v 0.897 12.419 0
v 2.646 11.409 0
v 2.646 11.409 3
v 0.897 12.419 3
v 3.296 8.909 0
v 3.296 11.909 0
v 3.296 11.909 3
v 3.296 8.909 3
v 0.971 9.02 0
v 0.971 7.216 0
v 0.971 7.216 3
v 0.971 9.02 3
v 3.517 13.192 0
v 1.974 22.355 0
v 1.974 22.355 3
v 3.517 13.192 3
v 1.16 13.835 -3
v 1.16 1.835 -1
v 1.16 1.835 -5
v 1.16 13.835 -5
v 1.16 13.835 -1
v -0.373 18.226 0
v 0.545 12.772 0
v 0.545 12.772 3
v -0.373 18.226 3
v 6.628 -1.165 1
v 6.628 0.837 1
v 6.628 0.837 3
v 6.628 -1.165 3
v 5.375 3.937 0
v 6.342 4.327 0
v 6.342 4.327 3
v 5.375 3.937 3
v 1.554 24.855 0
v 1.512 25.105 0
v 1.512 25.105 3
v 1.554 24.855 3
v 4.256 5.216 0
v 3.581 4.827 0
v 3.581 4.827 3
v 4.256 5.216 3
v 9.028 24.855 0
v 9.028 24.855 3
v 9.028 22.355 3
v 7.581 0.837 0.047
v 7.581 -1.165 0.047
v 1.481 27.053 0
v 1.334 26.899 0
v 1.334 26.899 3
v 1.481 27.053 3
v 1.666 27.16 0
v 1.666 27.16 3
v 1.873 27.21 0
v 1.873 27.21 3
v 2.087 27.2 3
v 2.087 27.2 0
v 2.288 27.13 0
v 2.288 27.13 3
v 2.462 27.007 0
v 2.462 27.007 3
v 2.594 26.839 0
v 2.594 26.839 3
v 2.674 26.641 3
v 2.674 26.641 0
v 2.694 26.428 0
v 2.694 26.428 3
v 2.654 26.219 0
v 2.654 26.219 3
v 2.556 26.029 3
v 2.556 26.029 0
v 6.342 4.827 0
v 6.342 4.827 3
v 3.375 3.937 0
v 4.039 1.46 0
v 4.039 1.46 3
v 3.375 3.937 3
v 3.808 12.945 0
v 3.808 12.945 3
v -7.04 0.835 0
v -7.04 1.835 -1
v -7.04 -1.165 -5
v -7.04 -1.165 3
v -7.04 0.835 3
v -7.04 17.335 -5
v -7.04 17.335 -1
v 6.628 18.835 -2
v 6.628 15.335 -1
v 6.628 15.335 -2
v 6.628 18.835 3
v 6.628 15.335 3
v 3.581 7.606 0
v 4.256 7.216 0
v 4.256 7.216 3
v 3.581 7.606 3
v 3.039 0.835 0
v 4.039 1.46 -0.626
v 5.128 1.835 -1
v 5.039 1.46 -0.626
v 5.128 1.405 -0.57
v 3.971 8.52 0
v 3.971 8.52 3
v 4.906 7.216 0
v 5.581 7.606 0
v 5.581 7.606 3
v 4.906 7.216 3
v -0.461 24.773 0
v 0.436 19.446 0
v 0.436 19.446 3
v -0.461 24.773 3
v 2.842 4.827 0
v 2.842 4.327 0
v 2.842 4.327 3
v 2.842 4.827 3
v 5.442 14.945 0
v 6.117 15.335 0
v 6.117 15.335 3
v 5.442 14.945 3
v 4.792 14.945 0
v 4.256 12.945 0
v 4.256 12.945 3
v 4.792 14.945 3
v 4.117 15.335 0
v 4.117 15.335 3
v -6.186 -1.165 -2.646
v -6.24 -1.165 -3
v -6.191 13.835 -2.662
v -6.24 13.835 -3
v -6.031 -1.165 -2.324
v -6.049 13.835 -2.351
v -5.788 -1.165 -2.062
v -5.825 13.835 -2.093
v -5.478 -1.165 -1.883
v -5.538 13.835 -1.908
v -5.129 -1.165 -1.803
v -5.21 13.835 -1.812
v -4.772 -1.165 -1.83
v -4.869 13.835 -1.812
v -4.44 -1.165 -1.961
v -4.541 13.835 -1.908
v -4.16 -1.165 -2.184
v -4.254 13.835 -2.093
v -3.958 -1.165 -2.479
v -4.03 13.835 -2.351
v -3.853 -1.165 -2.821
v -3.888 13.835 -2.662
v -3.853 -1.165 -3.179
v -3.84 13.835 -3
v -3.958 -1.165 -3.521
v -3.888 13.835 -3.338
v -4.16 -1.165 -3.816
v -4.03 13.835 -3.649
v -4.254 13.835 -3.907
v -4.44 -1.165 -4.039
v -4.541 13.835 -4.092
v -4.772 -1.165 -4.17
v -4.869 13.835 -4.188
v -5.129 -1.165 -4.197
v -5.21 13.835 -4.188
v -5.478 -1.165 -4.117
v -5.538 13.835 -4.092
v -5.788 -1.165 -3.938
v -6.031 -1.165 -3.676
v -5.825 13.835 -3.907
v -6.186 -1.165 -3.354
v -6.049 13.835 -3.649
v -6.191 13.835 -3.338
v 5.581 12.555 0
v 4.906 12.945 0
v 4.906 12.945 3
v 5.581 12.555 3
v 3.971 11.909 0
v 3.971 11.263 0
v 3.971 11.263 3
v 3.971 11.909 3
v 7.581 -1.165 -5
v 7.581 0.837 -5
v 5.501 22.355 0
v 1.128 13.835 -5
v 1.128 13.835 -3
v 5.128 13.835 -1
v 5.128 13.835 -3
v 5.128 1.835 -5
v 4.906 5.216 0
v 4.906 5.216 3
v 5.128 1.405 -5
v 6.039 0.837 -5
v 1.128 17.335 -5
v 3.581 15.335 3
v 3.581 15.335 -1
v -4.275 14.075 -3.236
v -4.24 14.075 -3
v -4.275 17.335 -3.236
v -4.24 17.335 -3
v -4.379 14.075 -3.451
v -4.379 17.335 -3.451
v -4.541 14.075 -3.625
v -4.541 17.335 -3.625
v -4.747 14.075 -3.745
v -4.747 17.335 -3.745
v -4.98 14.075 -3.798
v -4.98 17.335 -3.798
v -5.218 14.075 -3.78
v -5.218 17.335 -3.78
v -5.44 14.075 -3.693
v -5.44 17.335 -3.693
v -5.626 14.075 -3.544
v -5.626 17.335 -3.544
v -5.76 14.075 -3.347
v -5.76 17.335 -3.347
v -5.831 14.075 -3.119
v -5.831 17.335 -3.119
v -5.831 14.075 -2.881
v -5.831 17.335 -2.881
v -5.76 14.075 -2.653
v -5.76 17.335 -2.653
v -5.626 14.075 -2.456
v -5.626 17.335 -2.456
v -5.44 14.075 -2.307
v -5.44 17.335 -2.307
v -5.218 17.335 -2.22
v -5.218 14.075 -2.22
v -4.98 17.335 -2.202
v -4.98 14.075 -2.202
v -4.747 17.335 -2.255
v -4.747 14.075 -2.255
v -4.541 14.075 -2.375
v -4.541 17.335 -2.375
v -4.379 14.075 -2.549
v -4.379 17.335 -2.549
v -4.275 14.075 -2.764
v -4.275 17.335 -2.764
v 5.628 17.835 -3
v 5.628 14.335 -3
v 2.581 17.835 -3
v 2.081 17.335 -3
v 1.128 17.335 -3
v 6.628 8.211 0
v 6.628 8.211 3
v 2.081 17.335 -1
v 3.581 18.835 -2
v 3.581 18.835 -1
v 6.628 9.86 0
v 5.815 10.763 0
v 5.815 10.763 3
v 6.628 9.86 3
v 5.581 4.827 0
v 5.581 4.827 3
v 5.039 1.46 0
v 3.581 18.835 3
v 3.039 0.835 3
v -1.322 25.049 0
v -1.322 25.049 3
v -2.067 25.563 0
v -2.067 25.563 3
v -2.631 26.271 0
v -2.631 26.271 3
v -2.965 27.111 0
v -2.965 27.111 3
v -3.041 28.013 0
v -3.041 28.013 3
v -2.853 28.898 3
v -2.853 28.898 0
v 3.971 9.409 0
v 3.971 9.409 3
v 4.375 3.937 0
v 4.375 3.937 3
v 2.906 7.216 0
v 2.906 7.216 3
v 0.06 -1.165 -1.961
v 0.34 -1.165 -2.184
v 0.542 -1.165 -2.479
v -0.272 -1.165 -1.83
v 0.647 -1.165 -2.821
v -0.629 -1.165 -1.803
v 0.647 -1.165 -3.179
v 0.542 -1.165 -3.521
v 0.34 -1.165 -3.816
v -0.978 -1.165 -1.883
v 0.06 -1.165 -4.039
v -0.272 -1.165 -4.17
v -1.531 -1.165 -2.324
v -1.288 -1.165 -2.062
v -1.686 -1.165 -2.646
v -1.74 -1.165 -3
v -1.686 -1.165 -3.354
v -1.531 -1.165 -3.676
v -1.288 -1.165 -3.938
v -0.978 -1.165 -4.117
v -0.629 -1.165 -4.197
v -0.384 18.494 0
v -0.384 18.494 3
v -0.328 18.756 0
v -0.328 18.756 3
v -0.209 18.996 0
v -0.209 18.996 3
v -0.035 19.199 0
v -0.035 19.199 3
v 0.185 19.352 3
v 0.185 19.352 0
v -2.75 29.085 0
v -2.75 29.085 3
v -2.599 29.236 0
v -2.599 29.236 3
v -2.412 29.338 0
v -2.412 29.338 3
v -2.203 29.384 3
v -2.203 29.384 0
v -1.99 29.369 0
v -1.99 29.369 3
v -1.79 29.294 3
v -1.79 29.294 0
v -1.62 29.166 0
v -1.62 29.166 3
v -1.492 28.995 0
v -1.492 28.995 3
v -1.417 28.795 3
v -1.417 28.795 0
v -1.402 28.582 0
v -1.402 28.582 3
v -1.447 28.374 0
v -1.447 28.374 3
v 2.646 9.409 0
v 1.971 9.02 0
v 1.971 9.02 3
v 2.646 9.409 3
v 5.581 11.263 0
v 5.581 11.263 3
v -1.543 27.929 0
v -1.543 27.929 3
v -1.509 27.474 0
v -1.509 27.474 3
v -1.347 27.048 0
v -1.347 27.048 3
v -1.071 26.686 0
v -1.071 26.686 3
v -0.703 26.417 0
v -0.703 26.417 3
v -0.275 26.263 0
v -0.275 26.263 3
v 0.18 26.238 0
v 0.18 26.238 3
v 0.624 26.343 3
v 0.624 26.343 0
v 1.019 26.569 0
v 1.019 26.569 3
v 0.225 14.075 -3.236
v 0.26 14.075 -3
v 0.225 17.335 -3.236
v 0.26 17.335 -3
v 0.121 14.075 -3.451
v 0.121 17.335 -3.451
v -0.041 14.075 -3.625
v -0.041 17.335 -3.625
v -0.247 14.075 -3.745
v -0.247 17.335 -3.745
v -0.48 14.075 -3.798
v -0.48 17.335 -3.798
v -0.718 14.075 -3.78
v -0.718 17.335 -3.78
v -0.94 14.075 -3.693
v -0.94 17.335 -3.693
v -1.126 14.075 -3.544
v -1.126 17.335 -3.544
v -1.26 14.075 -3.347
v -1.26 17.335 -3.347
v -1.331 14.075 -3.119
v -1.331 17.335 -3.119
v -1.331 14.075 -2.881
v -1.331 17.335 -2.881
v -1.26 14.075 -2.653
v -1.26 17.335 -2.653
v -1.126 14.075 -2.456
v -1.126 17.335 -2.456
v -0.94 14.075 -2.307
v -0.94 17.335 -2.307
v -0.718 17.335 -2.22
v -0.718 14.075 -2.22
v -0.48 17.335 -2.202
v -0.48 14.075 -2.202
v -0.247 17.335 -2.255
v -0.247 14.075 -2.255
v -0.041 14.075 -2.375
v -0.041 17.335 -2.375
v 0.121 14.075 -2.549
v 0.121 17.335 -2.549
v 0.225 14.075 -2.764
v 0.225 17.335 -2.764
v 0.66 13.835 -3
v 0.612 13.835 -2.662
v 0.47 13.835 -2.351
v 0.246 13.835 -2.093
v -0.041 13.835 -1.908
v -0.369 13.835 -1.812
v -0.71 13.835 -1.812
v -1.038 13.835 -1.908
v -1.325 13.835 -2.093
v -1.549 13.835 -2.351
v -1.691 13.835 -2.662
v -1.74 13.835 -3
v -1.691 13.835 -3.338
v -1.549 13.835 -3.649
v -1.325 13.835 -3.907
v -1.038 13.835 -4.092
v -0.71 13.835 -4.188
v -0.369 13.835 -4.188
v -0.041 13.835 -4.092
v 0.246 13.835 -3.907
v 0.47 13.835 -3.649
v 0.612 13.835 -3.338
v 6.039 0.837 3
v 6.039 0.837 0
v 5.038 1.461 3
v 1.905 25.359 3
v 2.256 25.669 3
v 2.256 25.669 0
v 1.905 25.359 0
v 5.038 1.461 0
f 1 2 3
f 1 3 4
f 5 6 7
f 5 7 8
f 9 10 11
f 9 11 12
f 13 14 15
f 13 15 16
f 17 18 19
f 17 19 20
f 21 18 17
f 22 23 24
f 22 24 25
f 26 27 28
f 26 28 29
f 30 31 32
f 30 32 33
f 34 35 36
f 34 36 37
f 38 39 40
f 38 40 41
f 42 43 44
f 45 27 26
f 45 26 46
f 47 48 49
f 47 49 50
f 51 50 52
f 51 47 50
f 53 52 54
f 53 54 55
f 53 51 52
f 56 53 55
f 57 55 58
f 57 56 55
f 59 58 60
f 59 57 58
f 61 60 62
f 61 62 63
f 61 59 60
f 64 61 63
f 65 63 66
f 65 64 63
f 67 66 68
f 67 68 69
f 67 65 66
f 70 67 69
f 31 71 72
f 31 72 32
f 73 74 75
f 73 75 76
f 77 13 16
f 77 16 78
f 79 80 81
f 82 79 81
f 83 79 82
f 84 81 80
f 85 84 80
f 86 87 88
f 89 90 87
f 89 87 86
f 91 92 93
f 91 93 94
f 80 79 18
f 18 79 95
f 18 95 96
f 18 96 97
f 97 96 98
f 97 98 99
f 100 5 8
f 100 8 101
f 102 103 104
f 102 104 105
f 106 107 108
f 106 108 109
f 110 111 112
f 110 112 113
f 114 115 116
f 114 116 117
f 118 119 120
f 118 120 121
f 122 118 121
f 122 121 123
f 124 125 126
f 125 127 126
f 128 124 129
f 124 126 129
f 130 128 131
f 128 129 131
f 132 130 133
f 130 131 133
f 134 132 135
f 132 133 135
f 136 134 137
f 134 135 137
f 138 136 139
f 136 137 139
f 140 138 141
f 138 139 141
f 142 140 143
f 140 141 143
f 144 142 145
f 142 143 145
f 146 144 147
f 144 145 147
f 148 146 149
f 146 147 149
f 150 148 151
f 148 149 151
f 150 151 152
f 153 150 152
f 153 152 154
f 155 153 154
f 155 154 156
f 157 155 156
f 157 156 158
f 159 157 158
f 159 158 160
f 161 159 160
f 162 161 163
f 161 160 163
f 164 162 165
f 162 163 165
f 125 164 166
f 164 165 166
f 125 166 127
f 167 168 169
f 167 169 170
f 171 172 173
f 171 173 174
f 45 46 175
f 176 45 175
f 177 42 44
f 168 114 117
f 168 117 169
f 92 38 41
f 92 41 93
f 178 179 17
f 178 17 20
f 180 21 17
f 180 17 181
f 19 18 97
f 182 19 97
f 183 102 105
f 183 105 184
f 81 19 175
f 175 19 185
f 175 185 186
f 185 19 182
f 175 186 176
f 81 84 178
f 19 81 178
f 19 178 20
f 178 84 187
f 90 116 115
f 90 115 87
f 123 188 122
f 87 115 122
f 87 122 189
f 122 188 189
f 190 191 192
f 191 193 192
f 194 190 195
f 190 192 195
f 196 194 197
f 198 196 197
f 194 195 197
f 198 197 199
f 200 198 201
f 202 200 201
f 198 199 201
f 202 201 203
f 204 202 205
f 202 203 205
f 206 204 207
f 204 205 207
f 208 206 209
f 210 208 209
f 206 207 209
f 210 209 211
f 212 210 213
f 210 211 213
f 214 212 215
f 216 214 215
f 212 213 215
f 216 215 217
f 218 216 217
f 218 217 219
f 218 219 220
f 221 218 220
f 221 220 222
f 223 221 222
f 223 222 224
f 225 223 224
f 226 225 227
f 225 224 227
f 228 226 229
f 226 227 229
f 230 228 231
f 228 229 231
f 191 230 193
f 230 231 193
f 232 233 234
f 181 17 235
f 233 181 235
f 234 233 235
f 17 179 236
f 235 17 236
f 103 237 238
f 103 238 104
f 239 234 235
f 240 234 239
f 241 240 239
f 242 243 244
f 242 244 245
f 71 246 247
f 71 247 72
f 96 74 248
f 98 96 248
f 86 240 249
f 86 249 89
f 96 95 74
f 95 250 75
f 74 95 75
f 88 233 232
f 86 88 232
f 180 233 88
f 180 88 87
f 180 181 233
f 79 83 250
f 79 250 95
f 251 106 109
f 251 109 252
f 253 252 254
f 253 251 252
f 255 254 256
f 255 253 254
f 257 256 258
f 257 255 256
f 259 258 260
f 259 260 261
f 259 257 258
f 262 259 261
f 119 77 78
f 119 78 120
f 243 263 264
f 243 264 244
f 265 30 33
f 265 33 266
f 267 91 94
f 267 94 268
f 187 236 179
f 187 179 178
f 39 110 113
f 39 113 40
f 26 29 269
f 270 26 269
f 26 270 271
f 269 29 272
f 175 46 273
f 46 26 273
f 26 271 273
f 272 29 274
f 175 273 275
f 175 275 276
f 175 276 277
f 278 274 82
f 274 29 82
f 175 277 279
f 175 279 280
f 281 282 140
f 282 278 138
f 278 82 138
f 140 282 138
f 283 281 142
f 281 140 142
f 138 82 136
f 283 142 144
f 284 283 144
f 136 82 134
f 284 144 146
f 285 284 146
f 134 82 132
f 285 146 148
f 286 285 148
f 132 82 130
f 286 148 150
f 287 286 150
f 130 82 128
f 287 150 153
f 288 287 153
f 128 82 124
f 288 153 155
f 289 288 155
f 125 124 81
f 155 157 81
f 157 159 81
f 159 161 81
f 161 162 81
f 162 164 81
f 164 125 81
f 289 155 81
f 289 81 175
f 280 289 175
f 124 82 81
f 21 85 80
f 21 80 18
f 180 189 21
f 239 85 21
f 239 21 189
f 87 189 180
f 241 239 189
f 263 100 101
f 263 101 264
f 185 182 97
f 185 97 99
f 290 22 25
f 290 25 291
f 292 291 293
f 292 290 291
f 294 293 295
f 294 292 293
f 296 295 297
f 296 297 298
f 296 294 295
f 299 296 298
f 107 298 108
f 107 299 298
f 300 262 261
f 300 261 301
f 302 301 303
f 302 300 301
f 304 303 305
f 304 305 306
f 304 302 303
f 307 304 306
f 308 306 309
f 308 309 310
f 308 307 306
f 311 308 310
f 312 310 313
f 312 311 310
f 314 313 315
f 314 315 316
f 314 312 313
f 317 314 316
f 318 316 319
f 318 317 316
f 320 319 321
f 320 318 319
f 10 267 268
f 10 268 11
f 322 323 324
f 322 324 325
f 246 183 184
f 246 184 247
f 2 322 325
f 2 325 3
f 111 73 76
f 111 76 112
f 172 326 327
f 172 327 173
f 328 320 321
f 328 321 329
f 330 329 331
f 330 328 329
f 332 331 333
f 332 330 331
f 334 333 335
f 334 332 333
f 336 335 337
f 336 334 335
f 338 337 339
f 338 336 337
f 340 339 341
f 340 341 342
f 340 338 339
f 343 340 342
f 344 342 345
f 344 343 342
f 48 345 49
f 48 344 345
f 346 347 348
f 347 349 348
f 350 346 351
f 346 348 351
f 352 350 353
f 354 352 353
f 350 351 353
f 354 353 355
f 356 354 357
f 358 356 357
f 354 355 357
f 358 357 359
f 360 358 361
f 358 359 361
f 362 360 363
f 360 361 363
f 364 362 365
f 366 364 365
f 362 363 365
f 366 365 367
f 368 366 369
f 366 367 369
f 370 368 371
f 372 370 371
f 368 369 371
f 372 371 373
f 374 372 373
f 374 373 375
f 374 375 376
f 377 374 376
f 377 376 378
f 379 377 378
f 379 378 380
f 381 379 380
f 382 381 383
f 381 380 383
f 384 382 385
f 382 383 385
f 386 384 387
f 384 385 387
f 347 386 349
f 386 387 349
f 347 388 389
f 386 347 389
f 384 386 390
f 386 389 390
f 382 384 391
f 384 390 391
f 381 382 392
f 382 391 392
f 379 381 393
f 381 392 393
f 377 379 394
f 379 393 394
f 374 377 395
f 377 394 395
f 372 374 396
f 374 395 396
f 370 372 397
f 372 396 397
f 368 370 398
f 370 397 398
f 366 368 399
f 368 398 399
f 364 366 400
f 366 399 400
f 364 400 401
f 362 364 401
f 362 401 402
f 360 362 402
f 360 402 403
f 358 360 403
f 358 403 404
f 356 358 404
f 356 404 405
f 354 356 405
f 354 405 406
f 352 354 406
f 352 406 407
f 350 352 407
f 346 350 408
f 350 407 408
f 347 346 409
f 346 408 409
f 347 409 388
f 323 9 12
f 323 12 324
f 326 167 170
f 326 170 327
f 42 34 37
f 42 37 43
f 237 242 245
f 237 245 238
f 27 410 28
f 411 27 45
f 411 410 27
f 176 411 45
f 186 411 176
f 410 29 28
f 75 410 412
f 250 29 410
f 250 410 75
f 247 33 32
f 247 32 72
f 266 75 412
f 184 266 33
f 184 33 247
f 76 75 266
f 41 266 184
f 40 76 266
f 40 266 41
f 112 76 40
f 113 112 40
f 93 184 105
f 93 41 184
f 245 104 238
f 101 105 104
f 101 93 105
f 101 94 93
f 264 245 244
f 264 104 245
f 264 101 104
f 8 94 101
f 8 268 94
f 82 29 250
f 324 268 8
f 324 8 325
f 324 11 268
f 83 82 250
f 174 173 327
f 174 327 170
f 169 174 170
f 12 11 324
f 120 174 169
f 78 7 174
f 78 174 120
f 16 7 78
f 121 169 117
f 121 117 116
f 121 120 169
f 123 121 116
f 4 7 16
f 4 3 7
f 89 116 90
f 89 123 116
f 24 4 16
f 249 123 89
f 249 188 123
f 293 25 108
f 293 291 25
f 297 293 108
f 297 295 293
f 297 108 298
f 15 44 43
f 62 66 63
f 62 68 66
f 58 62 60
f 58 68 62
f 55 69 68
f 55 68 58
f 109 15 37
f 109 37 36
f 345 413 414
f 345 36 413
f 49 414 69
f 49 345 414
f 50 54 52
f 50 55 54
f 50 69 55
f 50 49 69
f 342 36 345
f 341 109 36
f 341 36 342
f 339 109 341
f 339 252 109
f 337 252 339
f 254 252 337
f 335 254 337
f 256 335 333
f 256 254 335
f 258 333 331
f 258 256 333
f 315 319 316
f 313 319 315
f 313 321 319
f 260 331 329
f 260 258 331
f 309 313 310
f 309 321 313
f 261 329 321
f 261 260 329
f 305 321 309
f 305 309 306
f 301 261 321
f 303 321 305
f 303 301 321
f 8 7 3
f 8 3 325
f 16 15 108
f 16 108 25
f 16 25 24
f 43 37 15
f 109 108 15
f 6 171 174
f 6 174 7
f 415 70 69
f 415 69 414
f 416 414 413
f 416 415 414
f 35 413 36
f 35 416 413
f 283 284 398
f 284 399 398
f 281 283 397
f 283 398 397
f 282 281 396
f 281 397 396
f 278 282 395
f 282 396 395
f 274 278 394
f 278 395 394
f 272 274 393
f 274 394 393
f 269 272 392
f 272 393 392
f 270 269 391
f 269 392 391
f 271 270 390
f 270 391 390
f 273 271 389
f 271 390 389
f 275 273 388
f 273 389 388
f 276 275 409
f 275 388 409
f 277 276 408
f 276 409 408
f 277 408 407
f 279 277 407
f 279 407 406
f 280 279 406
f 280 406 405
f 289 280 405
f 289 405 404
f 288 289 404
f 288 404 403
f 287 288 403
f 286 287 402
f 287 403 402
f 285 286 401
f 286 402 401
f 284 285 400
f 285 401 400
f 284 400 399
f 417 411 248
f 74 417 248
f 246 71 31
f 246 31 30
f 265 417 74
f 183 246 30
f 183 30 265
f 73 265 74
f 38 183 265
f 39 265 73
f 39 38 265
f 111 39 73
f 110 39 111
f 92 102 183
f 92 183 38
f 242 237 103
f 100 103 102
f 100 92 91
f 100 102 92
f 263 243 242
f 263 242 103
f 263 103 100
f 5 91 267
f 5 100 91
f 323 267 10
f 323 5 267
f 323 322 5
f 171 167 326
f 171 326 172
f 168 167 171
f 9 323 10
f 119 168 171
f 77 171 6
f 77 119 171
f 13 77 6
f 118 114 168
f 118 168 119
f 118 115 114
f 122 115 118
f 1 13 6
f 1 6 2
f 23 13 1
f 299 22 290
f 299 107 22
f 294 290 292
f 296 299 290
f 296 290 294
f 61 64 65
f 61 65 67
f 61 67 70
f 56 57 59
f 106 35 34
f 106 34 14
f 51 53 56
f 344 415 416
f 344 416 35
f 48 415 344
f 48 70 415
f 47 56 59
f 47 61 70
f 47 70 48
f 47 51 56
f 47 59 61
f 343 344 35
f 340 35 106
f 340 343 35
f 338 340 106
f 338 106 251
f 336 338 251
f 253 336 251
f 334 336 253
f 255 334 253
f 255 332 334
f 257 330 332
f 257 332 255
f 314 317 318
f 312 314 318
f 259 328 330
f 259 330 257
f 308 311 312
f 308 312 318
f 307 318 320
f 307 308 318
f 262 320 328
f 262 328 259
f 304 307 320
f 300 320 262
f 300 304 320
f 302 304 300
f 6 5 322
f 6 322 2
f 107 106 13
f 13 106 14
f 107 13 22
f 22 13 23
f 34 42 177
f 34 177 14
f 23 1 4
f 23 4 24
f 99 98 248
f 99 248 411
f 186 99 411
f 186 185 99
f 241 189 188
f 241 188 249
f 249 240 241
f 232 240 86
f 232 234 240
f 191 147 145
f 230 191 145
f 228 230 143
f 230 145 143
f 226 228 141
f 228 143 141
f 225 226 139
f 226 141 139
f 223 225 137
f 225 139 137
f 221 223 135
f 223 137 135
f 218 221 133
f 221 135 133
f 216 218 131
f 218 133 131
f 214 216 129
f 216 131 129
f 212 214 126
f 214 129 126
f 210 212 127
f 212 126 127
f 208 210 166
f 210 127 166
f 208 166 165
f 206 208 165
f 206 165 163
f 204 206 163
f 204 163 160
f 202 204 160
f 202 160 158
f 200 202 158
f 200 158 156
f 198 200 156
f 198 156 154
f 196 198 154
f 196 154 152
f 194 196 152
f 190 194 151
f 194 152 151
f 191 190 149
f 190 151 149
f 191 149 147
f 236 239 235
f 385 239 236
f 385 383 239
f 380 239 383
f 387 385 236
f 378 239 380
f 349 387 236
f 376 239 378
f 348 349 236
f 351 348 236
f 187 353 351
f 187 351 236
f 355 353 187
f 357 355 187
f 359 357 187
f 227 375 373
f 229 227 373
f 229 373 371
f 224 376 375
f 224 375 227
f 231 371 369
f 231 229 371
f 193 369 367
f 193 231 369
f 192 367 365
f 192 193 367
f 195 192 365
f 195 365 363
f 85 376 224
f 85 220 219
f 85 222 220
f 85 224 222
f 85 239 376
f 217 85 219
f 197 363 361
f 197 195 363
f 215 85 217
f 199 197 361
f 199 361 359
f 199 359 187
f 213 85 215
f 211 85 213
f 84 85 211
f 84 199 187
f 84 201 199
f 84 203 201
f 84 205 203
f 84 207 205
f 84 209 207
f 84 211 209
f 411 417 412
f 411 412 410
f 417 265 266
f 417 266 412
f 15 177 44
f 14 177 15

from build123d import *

# Parameters (mm, degrees)
BOSS_SWITCH_BODY_DEPTH                    = 3
SKETCH1_W                                 = 4
SKETCH1_H                                 = 3.5
BOSS_FLANGE_WIDTH_DEPTH                   = 5
BOSS_FLANGE_HEIGHT_REACH                  = 35.863
SKETCH2_W                                 = 4
SKETCH2_H                                 = 2
SKETCH2_W_2                               = 8
CUT_UP_TO_DOWN_DERAILLEUR_CLEARANCE_REACH = 21.462
SKETCH10_W                                = 2.453096586
SKETCH10_H                                = 3
SKETCH17_W                                = 12.1675
SKETCH17_H                                = 4
BOSS_FLANGE_SUPPORT_DEPTH                 = 14.5
TAP_DRILL_FOR_M2X0_4_TAP1_D               = 1.6
M2_CLEARANCE_HOLE2_D                      = 2.4
M2_CLEARANCE_HOLE2_DEPTH                  = 15
M2_CLEARANCE_HOLE2_TIP                    = 0.721032743
CHAMFER_FLANGE_SUPPORT_SIZE               = 1.5
CHAMFER_FLANGE_SUPPORT_2_SIZE             = 1.5
CHAMFER_FLANGE_SUPPORT_3_SIZE             = 1
SKETCH23_W                                = 3.9675
SKETCH23_H                                = 12
CUT_GAP_FOR_PRINTING_DEPTH                = 32.000499688
SKETCH25_W                                = 0.953096586
SKETCH25_H                                = 3.5
CUT_DERAILLEUR_CLEARANCE_DEPTH            = 32.145320369
CHAMFER8_SIZE                             = 1
CUT_EXTRUDE1_REACH                        = 30.441
SKETCH26_W                                = 7.075346244
SKETCH26_H                                = 3.905124838
CUT_WIDE_DERAILLEUR_CLEARANCE_DEPTH       = 33.195879702
CUT_WIDE_DERAILLEUR_CLEARANCE_DEPTH_BACK  = 4
SKETCH27_W                                = 2
SKETCH27_H                                = 5
CHAMFER9_SIZE                             = 1


# Some blends are built 0.0001 mm under size
with BuildPart() as part:
    # Sketch-SwitchBossUp → Boss-Switch Body (new body)
    with BuildSketch(Plane.XY):
        with BuildLine():
            Line((5.581091201, 12.555245643), (5.581100766, 11.263016279))
            Line((5.581100766, 11.263016279), (3.971265023, 11.263016279))
            Line((3.971265023, 11.263016279), (3.971265023, 11.909403061))
            Line((3.971265023, 11.909403061), (3.296271341, 11.909403061))
            Line((3.296271341, 11.909403061), (3.296271341, 11.409403061))
            Line((3.296271341, 11.409403061), (3.296271341, 9.409403061))
            Line((3.296271341, 9.409403061), (3.296271341, 8.909403061))
            Line((3.296271341, 8.909403061), (3.971278743, 8.519687356))
            Line((3.971278743, 8.519687356), (3.971278743, 9.409408058))
            Line((3.971278743, 9.409408058), (5.815189336, 10.763016279))
            Line((5.815189336, 10.763016279), (6.627976927, 9.860324207))
            Line((6.627976927, 9.860324207), (6.627976927, 8.210536506))
            Line((6.627976927, 8.210536506), (5.581127833, 7.606137899))
            Line((5.581127833, 7.606137899), (4.906138119, 7.216432406))
            Line((4.906138119, 7.216432406), (4.906138119, 5.216432406))
            Line((4.906138119, 5.216432406), (5.58114552, 4.826716701))
            Line((5.58114552, 4.826716701), (6.342350466, 4.826716701))
            Line((6.342350466, 4.826716701), (6.342350466, 4.326716701))
            Line((6.342350466, 4.326716701), (5.374946804, 3.937018274))
            Line((5.374946804, 3.937018274), (4.374946804, 3.937018274))
            Line((4.374946804, 3.937018274), (5.038286759, 1.461399857))
            Line((5.038286759, 1.461399857), (6.03883266, 0.837018274))
            Line((6.03883266, 0.837018274), (6.627976927, 0.837018274))
            Line((6.627976927, 0.837018274), (6.627976927, -1.165310653))
            Line((6.627976927, -1.165310653), (5.038286759, -1.165310653))
            Line((5.038286759, -1.165310653), (3.03883266, -1.165310653))
            Line((3.03883266, -1.165310653), (3.03883266, 0.834689347))
            Line((3.03883266, 0.834689347), (4.03855971, 1.460381193))
            Line((4.03855971, 1.460381193), (3.374946804, 3.937018274))
            Line((3.374946804, 3.937018274), (2.842350466, 4.326720436))
            Line((2.842350466, 4.326720436), (2.842350466, 4.826720436))
            Line((2.842350466, 4.826720436), (3.58114552, 4.826720436))
            Line((3.58114552, 4.826720436), (4.256138119, 5.216427595))
            Line((4.256138119, 5.216427595), (4.256138119, 7.216427595))
            Line((4.256138119, 7.216427595), (3.581130717, 7.6061433))
            Line((3.581130717, 7.6061433), (2.9061262, 7.216422599))
            Line((2.9061262, 7.216422599), (0.971281627, 7.216422599))
            Line((0.971281627, 7.216422599), (0.971281627, 9.019692757))
            Line((0.971281627, 9.019692757), (1.971281627, 9.019692757))
            Line((1.971281627, 9.019692757), (2.646271341, 9.40939825))
            Line((2.646271341, 9.40939825), (2.646271341, 11.40939825))
            Line((2.646271341, 11.40939825), (0.897326855, 12.41915182))
            Line((0.897326855, 12.41915182), (0.545466745, 12.771663724))
            Line((0.545466745, 12.771663724), (-0.372784255, 18.226393961))
            ThreePointArc((-0.372784255, 18.226393961), (-0.209313172, 18.996084896), (0.435897335, 19.446473985))
            Line((0.435897335, 19.446473985), (-0.46073685, 24.772792819))
            ThreePointArc((-0.46073685, 24.772792819), (-2.630501593, 26.270619745), (-2.852546321, 28.897797067))
            ThreePointArc((-2.852546321, 28.897797067), (-1.887813913, 29.338582026), (-1.447028953, 28.373849618))
            ThreePointArc((-1.447028953, 28.373849618), (-0.703448682, 26.416936722), (1.333779254, 26.898727173))
            ThreePointArc((1.333779254, 26.898727173), (2.379722745, 27.074801628), (2.555797201, 26.028858137))
            ThreePointArc((2.555797201, 26.028858137), (2.086504637, 25.507104397), (1.511513111, 25.104801997))
            Line((1.511513111, 25.104801997), (1.553598189, 24.854801997))
            Line((1.553598189, 24.854801997), (9.027976927, 24.854801997))
            Line((9.027976927, 24.854801997), (9.027976927, 22.354801997))
            Line((9.027976927, 22.354801997), (1.974448974, 22.354801997))
            Line((1.974448974, 22.354801997), (3.516958068, 13.191761617))
            Line((3.516958068, 13.191761617), (3.808459197, 12.945132837))
            Line((3.808459197, 12.945132837), (4.256080915, 12.944958203))
            Line((4.256080915, 12.944958203), (4.791964496, 14.944962169))
            Line((4.791964496, 14.944962169), (4.116925685, 15.334689347))
            Line((4.116925685, 15.334689347), (3.581073513, 15.334689347))
            Line((3.581073513, 15.334689347), (3.581073513, 18.834689347))
            Line((3.581073513, 18.834689347), (5.725580434, 18.834689347))
            Line((5.725580434, 18.834689347), (6.627976927, 18.834689347))
            Line((6.627976927, 18.834689347), (6.627976927, 15.334689347))
            Line((6.627976927, 15.334689347), (6.116971898, 15.334689347))
            Line((6.116971898, 15.334689347), (5.441964496, 14.94496698))
            Line((5.441964496, 14.94496698), (4.906080915, 12.944963014))
            Line((4.906080915, 12.944963014), (5.581091201, 12.555245643))
        make_face()
    extrude(amount=BOSS_SWITCH_BODY_DEPTH)

    # Sketch1 → Boss-Flange Width (add)
    with BuildSketch(Plane(origin=(0, 0, 0), x_dir=(-1, 0, 0), z_dir=(0, 0, -1))):
        Polygon((-7.581073513, -1.165310653), (0.412170615, -1.165310653), (0.412170615, 0.834689347), (-3.03883266, 0.834689347), (-4.03855971, 1.460381193), (-5.03855971, 1.460381193), (-6.03883266, 0.837018274), (-7.581073513, 0.837018274), align=None)
        with Locations((-5.581073513, 17.084689347)):
            Rectangle(SKETCH1_W, SKETCH1_H)
    extrude(amount=BOSS_FLANGE_WIDTH_DEPTH)

    # Sketch2 → Boss-Flange Height (add, up to next)
    with BuildSketch(Plane(origin=(-7.039523073, 0, 0), x_dir=(0, 0, -1), z_dir=(1, 0, 0)), mode=Mode.PRIVATE) as boss_flange_height_sk1:
        with Locations((3, 16.334689347)):
            Rectangle(SKETCH2_W, SKETCH2_H)
    boss_flange_height_tool1 = extrude(boss_flange_height_sk1.sketch, amount=BOSS_FLANGE_HEIGHT_REACH, mode=Mode.PRIVATE) - part.part
    # Sketch2 → Boss-Flange Height (add, up to next)
    with BuildSketch(Plane(origin=(-7.039523073, 0, 0), x_dir=(0, 0, -1), z_dir=(1, 0, 0)), mode=Mode.PRIVATE) as boss_flange_height_sk2:
        with Locations((1, -0.165310653)):
            Rectangle(SKETCH2_W_2, SKETCH2_H)
    boss_flange_height_tool2 = extrude(boss_flange_height_sk2.sketch, amount=BOSS_FLANGE_HEIGHT_REACH, mode=Mode.PRIVATE) - part.part
    add(boss_flange_height_tool1.solids().sort_by_distance((-7.039523, 16.334689, -3))[0])
    add(boss_flange_height_tool2.solids().sort_by_distance((-7.039523, -0.165311, -1))[0])

    # Sketch10 → Cut-Up-To-Down Derailleur Clearance (cut, up to next)
    with BuildSketch(Plane(origin=(0, 15.334689347, 0), x_dir=(1, 0, 0), z_dir=(0, 1, 0)), mode=Mode.PRIVATE) as cut_up_to_down_derailleur_clearance_sk1:
        with Locations((6.35452522, 3.5)):
            Rectangle(SKETCH10_W, SKETCH10_H)
    cut_up_to_down_derailleur_clearance_tool1 = extrude(cut_up_to_down_derailleur_clearance_sk1.sketch, amount=CUT_UP_TO_DOWN_DERAILLEUR_CLEARANCE_REACH, mode=Mode.PRIVATE) & part.part
    add(cut_up_to_down_derailleur_clearance_tool1.solids().sort_by_distance((6.354525, 15.334689, -3.5))[0], mode=Mode.SUBTRACT)

    # Sketch17 → Boss-Flange Support (add)
    with BuildSketch(Plane.XZ.offset(-15.334689347)):
        with Locations((-0.955773073, -3)):
            Rectangle(SKETCH17_W, SKETCH17_H)
    extrude(amount=BOSS_FLANGE_SUPPORT_DEPTH)

    # Tap Drill for M2x0.4 Tap1 (through all)
    with Locations(Plane(origin=(0, -1.165310653, 0), x_dir=(-1, 0, 0), z_dir=(0, -1, 0))):
        with Locations((5.039523073, 3), (0.539523073, 3)):
            Hole(TAP_DRILL_FOR_M2X0_4_TAP1_D / 2)

    # M2 Clearance Hole2
    with Locations(Plane.XZ.offset(1.165310653)):
        with Locations((-5.039523073, -3), (-0.539523073, -3)):
            Hole(M2_CLEARANCE_HOLE2_D / 2, depth=M2_CLEARANCE_HOLE2_DEPTH)
            with Locations((0, 0, -(M2_CLEARANCE_HOLE2_DEPTH + M2_CLEARANCE_HOLE2_TIP / 2))):  # 118° drill point
                Cone(0, M2_CLEARANCE_HOLE2_D / 2, M2_CLEARANCE_HOLE2_TIP, mode=Mode.SUBTRACT)

    # Chamfer-Flange Support
    chamfer_flange_support_edges = [part.edges().sort_by_distance(p)[0] for p in [
        (3.581073513, 17.334689347, -3),
    ]]
    chamfer(chamfer_flange_support_edges, length=CHAMFER_FLANGE_SUPPORT_SIZE - 0.0001)  # a hair under: the kernel refuses the full size

    # Chamfer-Flange Support 2
    chamfer_flange_support_2_edges = [part.edges().sort_by_distance(p)[0] for p in [
        (5.127976927, 17.084689347, -2),
        (5.127976927, 15.334689347, -1.5),
    ]]
    chamfer(chamfer_flange_support_2_edges, length=CHAMFER_FLANGE_SUPPORT_2_SIZE)

    # Chamfer-Flange Support 3
    chamfer_flange_support_3_edges = [part.edges().sort_by_distance(p)[0] for p in [
        (-2.000345206, 0.834689347, -1),
    ]]
    chamfer(chamfer_flange_support_3_edges, length=CHAMFER_FLANGE_SUPPORT_3_SIZE)

    # Sketch23 → Cut-Gap for Printing (cut, through all)
    with BuildSketch(Plane.XY.offset(-1)):
        with Locations((3.144226927, 7.834689347)):
            Rectangle(SKETCH23_W, SKETCH23_H)
    extrude(amount=-CUT_GAP_FOR_PRINTING_DEPTH, mode=Mode.SUBTRACT)

    # Sketch25 → Cut-Derailleur Clearance (cut, through all)
    with BuildSketch(Plane.XY):
        with Locations((7.10452522, 17.084689347)):
            Rectangle(SKETCH25_W, SKETCH25_H)
    extrude(amount=-CUT_DERAILLEUR_CLEARANCE_DEPTH, mode=Mode.SUBTRACT)

    # Chamfer8
    # the kernel refuses this chamfer: 1 mm, written as the material it adds along each edge
    with BuildSketch(Plane(origin=(6.627976927, 0.837018274, 0), x_dir=(-0.027495876610586494, 0, 0.9996219169112968), z_dir=(0, -1, 0))) as chamfer8_piece_1_section:
        Polygon((CHAMFER8_SIZE * 0.999621916911, -CHAMFER8_SIZE * 0.0274958766106), (-CHAMFER8_SIZE * 0.0274958766106, -CHAMFER8_SIZE * 0.999621916911), (0, 0), align=None)
    chamfer8_piece_1 = extrude(amount=2.002328927, mode=Mode.PRIVATE)
    chamfer8_piece_1 = split(chamfer8_piece_1, bisect_by=Plane(origin=(7.581073513, -0.16414619, 0.332375145), z_dir=(-1, 0, 0)), keep=Keep.TOP, mode=Mode.PRIVATE)
    add(chamfer8_piece_1)

    # Sketch26 → Cut-Extrude1 (cut, up to next)
    with BuildSketch(Plane(origin=(-5.954769273, 8.400426305, 7.000355254), x_dir=(-0.8782236755158304, -0.3674019179359696, -0.30616826494664123), z_dir=(0.47825011841448156, -0.6746701157774819, -0.5622250964812346)), mode=Mode.PRIVATE) as cut_extrude1_sk1:
        with Locations((-16.492565132, 13.959094076)):
            Rectangle(SKETCH26_W, SKETCH26_H)
    cut_extrude1_tool1 = extrude(cut_extrude1_sk1.sketch, amount=CUT_EXTRUDE1_REACH, mode=Mode.PRIVATE) & part.part
    add(cut_extrude1_tool1.solids().sort_by_distance((8.529392, 23.396221, 1.326182))[0], mode=Mode.SUBTRACT)

    # Sketch27 → Cut-Wide Derailleur Clearance (cut, two sides: drawn at the far end of the back side and taken through both)
    with BuildSketch(Plane(origin=(5.127976927, 0, 0), x_dir=(0, 0, -1), z_dir=(1, 0, 0)).offset(-CUT_WIDE_DERAILLEUR_CLEARANCE_DEPTH_BACK)):
        with Locations((4, 16.334689347)):
            Rectangle(SKETCH27_W, SKETCH27_H)
    extrude(amount=CUT_WIDE_DERAILLEUR_CLEARANCE_DEPTH + CUT_WIDE_DERAILLEUR_CLEARANCE_DEPTH_BACK, mode=Mode.SUBTRACT)

    # Chamfer9
    chamfer9_edges = [part.edges().sort_by_distance(p)[0] for p in [
        (4.60452522, 18.834689347, -3),
    ]]
    chamfer(chamfer9_edges, length=CHAMFER9_SIZE)


solid = part.part
